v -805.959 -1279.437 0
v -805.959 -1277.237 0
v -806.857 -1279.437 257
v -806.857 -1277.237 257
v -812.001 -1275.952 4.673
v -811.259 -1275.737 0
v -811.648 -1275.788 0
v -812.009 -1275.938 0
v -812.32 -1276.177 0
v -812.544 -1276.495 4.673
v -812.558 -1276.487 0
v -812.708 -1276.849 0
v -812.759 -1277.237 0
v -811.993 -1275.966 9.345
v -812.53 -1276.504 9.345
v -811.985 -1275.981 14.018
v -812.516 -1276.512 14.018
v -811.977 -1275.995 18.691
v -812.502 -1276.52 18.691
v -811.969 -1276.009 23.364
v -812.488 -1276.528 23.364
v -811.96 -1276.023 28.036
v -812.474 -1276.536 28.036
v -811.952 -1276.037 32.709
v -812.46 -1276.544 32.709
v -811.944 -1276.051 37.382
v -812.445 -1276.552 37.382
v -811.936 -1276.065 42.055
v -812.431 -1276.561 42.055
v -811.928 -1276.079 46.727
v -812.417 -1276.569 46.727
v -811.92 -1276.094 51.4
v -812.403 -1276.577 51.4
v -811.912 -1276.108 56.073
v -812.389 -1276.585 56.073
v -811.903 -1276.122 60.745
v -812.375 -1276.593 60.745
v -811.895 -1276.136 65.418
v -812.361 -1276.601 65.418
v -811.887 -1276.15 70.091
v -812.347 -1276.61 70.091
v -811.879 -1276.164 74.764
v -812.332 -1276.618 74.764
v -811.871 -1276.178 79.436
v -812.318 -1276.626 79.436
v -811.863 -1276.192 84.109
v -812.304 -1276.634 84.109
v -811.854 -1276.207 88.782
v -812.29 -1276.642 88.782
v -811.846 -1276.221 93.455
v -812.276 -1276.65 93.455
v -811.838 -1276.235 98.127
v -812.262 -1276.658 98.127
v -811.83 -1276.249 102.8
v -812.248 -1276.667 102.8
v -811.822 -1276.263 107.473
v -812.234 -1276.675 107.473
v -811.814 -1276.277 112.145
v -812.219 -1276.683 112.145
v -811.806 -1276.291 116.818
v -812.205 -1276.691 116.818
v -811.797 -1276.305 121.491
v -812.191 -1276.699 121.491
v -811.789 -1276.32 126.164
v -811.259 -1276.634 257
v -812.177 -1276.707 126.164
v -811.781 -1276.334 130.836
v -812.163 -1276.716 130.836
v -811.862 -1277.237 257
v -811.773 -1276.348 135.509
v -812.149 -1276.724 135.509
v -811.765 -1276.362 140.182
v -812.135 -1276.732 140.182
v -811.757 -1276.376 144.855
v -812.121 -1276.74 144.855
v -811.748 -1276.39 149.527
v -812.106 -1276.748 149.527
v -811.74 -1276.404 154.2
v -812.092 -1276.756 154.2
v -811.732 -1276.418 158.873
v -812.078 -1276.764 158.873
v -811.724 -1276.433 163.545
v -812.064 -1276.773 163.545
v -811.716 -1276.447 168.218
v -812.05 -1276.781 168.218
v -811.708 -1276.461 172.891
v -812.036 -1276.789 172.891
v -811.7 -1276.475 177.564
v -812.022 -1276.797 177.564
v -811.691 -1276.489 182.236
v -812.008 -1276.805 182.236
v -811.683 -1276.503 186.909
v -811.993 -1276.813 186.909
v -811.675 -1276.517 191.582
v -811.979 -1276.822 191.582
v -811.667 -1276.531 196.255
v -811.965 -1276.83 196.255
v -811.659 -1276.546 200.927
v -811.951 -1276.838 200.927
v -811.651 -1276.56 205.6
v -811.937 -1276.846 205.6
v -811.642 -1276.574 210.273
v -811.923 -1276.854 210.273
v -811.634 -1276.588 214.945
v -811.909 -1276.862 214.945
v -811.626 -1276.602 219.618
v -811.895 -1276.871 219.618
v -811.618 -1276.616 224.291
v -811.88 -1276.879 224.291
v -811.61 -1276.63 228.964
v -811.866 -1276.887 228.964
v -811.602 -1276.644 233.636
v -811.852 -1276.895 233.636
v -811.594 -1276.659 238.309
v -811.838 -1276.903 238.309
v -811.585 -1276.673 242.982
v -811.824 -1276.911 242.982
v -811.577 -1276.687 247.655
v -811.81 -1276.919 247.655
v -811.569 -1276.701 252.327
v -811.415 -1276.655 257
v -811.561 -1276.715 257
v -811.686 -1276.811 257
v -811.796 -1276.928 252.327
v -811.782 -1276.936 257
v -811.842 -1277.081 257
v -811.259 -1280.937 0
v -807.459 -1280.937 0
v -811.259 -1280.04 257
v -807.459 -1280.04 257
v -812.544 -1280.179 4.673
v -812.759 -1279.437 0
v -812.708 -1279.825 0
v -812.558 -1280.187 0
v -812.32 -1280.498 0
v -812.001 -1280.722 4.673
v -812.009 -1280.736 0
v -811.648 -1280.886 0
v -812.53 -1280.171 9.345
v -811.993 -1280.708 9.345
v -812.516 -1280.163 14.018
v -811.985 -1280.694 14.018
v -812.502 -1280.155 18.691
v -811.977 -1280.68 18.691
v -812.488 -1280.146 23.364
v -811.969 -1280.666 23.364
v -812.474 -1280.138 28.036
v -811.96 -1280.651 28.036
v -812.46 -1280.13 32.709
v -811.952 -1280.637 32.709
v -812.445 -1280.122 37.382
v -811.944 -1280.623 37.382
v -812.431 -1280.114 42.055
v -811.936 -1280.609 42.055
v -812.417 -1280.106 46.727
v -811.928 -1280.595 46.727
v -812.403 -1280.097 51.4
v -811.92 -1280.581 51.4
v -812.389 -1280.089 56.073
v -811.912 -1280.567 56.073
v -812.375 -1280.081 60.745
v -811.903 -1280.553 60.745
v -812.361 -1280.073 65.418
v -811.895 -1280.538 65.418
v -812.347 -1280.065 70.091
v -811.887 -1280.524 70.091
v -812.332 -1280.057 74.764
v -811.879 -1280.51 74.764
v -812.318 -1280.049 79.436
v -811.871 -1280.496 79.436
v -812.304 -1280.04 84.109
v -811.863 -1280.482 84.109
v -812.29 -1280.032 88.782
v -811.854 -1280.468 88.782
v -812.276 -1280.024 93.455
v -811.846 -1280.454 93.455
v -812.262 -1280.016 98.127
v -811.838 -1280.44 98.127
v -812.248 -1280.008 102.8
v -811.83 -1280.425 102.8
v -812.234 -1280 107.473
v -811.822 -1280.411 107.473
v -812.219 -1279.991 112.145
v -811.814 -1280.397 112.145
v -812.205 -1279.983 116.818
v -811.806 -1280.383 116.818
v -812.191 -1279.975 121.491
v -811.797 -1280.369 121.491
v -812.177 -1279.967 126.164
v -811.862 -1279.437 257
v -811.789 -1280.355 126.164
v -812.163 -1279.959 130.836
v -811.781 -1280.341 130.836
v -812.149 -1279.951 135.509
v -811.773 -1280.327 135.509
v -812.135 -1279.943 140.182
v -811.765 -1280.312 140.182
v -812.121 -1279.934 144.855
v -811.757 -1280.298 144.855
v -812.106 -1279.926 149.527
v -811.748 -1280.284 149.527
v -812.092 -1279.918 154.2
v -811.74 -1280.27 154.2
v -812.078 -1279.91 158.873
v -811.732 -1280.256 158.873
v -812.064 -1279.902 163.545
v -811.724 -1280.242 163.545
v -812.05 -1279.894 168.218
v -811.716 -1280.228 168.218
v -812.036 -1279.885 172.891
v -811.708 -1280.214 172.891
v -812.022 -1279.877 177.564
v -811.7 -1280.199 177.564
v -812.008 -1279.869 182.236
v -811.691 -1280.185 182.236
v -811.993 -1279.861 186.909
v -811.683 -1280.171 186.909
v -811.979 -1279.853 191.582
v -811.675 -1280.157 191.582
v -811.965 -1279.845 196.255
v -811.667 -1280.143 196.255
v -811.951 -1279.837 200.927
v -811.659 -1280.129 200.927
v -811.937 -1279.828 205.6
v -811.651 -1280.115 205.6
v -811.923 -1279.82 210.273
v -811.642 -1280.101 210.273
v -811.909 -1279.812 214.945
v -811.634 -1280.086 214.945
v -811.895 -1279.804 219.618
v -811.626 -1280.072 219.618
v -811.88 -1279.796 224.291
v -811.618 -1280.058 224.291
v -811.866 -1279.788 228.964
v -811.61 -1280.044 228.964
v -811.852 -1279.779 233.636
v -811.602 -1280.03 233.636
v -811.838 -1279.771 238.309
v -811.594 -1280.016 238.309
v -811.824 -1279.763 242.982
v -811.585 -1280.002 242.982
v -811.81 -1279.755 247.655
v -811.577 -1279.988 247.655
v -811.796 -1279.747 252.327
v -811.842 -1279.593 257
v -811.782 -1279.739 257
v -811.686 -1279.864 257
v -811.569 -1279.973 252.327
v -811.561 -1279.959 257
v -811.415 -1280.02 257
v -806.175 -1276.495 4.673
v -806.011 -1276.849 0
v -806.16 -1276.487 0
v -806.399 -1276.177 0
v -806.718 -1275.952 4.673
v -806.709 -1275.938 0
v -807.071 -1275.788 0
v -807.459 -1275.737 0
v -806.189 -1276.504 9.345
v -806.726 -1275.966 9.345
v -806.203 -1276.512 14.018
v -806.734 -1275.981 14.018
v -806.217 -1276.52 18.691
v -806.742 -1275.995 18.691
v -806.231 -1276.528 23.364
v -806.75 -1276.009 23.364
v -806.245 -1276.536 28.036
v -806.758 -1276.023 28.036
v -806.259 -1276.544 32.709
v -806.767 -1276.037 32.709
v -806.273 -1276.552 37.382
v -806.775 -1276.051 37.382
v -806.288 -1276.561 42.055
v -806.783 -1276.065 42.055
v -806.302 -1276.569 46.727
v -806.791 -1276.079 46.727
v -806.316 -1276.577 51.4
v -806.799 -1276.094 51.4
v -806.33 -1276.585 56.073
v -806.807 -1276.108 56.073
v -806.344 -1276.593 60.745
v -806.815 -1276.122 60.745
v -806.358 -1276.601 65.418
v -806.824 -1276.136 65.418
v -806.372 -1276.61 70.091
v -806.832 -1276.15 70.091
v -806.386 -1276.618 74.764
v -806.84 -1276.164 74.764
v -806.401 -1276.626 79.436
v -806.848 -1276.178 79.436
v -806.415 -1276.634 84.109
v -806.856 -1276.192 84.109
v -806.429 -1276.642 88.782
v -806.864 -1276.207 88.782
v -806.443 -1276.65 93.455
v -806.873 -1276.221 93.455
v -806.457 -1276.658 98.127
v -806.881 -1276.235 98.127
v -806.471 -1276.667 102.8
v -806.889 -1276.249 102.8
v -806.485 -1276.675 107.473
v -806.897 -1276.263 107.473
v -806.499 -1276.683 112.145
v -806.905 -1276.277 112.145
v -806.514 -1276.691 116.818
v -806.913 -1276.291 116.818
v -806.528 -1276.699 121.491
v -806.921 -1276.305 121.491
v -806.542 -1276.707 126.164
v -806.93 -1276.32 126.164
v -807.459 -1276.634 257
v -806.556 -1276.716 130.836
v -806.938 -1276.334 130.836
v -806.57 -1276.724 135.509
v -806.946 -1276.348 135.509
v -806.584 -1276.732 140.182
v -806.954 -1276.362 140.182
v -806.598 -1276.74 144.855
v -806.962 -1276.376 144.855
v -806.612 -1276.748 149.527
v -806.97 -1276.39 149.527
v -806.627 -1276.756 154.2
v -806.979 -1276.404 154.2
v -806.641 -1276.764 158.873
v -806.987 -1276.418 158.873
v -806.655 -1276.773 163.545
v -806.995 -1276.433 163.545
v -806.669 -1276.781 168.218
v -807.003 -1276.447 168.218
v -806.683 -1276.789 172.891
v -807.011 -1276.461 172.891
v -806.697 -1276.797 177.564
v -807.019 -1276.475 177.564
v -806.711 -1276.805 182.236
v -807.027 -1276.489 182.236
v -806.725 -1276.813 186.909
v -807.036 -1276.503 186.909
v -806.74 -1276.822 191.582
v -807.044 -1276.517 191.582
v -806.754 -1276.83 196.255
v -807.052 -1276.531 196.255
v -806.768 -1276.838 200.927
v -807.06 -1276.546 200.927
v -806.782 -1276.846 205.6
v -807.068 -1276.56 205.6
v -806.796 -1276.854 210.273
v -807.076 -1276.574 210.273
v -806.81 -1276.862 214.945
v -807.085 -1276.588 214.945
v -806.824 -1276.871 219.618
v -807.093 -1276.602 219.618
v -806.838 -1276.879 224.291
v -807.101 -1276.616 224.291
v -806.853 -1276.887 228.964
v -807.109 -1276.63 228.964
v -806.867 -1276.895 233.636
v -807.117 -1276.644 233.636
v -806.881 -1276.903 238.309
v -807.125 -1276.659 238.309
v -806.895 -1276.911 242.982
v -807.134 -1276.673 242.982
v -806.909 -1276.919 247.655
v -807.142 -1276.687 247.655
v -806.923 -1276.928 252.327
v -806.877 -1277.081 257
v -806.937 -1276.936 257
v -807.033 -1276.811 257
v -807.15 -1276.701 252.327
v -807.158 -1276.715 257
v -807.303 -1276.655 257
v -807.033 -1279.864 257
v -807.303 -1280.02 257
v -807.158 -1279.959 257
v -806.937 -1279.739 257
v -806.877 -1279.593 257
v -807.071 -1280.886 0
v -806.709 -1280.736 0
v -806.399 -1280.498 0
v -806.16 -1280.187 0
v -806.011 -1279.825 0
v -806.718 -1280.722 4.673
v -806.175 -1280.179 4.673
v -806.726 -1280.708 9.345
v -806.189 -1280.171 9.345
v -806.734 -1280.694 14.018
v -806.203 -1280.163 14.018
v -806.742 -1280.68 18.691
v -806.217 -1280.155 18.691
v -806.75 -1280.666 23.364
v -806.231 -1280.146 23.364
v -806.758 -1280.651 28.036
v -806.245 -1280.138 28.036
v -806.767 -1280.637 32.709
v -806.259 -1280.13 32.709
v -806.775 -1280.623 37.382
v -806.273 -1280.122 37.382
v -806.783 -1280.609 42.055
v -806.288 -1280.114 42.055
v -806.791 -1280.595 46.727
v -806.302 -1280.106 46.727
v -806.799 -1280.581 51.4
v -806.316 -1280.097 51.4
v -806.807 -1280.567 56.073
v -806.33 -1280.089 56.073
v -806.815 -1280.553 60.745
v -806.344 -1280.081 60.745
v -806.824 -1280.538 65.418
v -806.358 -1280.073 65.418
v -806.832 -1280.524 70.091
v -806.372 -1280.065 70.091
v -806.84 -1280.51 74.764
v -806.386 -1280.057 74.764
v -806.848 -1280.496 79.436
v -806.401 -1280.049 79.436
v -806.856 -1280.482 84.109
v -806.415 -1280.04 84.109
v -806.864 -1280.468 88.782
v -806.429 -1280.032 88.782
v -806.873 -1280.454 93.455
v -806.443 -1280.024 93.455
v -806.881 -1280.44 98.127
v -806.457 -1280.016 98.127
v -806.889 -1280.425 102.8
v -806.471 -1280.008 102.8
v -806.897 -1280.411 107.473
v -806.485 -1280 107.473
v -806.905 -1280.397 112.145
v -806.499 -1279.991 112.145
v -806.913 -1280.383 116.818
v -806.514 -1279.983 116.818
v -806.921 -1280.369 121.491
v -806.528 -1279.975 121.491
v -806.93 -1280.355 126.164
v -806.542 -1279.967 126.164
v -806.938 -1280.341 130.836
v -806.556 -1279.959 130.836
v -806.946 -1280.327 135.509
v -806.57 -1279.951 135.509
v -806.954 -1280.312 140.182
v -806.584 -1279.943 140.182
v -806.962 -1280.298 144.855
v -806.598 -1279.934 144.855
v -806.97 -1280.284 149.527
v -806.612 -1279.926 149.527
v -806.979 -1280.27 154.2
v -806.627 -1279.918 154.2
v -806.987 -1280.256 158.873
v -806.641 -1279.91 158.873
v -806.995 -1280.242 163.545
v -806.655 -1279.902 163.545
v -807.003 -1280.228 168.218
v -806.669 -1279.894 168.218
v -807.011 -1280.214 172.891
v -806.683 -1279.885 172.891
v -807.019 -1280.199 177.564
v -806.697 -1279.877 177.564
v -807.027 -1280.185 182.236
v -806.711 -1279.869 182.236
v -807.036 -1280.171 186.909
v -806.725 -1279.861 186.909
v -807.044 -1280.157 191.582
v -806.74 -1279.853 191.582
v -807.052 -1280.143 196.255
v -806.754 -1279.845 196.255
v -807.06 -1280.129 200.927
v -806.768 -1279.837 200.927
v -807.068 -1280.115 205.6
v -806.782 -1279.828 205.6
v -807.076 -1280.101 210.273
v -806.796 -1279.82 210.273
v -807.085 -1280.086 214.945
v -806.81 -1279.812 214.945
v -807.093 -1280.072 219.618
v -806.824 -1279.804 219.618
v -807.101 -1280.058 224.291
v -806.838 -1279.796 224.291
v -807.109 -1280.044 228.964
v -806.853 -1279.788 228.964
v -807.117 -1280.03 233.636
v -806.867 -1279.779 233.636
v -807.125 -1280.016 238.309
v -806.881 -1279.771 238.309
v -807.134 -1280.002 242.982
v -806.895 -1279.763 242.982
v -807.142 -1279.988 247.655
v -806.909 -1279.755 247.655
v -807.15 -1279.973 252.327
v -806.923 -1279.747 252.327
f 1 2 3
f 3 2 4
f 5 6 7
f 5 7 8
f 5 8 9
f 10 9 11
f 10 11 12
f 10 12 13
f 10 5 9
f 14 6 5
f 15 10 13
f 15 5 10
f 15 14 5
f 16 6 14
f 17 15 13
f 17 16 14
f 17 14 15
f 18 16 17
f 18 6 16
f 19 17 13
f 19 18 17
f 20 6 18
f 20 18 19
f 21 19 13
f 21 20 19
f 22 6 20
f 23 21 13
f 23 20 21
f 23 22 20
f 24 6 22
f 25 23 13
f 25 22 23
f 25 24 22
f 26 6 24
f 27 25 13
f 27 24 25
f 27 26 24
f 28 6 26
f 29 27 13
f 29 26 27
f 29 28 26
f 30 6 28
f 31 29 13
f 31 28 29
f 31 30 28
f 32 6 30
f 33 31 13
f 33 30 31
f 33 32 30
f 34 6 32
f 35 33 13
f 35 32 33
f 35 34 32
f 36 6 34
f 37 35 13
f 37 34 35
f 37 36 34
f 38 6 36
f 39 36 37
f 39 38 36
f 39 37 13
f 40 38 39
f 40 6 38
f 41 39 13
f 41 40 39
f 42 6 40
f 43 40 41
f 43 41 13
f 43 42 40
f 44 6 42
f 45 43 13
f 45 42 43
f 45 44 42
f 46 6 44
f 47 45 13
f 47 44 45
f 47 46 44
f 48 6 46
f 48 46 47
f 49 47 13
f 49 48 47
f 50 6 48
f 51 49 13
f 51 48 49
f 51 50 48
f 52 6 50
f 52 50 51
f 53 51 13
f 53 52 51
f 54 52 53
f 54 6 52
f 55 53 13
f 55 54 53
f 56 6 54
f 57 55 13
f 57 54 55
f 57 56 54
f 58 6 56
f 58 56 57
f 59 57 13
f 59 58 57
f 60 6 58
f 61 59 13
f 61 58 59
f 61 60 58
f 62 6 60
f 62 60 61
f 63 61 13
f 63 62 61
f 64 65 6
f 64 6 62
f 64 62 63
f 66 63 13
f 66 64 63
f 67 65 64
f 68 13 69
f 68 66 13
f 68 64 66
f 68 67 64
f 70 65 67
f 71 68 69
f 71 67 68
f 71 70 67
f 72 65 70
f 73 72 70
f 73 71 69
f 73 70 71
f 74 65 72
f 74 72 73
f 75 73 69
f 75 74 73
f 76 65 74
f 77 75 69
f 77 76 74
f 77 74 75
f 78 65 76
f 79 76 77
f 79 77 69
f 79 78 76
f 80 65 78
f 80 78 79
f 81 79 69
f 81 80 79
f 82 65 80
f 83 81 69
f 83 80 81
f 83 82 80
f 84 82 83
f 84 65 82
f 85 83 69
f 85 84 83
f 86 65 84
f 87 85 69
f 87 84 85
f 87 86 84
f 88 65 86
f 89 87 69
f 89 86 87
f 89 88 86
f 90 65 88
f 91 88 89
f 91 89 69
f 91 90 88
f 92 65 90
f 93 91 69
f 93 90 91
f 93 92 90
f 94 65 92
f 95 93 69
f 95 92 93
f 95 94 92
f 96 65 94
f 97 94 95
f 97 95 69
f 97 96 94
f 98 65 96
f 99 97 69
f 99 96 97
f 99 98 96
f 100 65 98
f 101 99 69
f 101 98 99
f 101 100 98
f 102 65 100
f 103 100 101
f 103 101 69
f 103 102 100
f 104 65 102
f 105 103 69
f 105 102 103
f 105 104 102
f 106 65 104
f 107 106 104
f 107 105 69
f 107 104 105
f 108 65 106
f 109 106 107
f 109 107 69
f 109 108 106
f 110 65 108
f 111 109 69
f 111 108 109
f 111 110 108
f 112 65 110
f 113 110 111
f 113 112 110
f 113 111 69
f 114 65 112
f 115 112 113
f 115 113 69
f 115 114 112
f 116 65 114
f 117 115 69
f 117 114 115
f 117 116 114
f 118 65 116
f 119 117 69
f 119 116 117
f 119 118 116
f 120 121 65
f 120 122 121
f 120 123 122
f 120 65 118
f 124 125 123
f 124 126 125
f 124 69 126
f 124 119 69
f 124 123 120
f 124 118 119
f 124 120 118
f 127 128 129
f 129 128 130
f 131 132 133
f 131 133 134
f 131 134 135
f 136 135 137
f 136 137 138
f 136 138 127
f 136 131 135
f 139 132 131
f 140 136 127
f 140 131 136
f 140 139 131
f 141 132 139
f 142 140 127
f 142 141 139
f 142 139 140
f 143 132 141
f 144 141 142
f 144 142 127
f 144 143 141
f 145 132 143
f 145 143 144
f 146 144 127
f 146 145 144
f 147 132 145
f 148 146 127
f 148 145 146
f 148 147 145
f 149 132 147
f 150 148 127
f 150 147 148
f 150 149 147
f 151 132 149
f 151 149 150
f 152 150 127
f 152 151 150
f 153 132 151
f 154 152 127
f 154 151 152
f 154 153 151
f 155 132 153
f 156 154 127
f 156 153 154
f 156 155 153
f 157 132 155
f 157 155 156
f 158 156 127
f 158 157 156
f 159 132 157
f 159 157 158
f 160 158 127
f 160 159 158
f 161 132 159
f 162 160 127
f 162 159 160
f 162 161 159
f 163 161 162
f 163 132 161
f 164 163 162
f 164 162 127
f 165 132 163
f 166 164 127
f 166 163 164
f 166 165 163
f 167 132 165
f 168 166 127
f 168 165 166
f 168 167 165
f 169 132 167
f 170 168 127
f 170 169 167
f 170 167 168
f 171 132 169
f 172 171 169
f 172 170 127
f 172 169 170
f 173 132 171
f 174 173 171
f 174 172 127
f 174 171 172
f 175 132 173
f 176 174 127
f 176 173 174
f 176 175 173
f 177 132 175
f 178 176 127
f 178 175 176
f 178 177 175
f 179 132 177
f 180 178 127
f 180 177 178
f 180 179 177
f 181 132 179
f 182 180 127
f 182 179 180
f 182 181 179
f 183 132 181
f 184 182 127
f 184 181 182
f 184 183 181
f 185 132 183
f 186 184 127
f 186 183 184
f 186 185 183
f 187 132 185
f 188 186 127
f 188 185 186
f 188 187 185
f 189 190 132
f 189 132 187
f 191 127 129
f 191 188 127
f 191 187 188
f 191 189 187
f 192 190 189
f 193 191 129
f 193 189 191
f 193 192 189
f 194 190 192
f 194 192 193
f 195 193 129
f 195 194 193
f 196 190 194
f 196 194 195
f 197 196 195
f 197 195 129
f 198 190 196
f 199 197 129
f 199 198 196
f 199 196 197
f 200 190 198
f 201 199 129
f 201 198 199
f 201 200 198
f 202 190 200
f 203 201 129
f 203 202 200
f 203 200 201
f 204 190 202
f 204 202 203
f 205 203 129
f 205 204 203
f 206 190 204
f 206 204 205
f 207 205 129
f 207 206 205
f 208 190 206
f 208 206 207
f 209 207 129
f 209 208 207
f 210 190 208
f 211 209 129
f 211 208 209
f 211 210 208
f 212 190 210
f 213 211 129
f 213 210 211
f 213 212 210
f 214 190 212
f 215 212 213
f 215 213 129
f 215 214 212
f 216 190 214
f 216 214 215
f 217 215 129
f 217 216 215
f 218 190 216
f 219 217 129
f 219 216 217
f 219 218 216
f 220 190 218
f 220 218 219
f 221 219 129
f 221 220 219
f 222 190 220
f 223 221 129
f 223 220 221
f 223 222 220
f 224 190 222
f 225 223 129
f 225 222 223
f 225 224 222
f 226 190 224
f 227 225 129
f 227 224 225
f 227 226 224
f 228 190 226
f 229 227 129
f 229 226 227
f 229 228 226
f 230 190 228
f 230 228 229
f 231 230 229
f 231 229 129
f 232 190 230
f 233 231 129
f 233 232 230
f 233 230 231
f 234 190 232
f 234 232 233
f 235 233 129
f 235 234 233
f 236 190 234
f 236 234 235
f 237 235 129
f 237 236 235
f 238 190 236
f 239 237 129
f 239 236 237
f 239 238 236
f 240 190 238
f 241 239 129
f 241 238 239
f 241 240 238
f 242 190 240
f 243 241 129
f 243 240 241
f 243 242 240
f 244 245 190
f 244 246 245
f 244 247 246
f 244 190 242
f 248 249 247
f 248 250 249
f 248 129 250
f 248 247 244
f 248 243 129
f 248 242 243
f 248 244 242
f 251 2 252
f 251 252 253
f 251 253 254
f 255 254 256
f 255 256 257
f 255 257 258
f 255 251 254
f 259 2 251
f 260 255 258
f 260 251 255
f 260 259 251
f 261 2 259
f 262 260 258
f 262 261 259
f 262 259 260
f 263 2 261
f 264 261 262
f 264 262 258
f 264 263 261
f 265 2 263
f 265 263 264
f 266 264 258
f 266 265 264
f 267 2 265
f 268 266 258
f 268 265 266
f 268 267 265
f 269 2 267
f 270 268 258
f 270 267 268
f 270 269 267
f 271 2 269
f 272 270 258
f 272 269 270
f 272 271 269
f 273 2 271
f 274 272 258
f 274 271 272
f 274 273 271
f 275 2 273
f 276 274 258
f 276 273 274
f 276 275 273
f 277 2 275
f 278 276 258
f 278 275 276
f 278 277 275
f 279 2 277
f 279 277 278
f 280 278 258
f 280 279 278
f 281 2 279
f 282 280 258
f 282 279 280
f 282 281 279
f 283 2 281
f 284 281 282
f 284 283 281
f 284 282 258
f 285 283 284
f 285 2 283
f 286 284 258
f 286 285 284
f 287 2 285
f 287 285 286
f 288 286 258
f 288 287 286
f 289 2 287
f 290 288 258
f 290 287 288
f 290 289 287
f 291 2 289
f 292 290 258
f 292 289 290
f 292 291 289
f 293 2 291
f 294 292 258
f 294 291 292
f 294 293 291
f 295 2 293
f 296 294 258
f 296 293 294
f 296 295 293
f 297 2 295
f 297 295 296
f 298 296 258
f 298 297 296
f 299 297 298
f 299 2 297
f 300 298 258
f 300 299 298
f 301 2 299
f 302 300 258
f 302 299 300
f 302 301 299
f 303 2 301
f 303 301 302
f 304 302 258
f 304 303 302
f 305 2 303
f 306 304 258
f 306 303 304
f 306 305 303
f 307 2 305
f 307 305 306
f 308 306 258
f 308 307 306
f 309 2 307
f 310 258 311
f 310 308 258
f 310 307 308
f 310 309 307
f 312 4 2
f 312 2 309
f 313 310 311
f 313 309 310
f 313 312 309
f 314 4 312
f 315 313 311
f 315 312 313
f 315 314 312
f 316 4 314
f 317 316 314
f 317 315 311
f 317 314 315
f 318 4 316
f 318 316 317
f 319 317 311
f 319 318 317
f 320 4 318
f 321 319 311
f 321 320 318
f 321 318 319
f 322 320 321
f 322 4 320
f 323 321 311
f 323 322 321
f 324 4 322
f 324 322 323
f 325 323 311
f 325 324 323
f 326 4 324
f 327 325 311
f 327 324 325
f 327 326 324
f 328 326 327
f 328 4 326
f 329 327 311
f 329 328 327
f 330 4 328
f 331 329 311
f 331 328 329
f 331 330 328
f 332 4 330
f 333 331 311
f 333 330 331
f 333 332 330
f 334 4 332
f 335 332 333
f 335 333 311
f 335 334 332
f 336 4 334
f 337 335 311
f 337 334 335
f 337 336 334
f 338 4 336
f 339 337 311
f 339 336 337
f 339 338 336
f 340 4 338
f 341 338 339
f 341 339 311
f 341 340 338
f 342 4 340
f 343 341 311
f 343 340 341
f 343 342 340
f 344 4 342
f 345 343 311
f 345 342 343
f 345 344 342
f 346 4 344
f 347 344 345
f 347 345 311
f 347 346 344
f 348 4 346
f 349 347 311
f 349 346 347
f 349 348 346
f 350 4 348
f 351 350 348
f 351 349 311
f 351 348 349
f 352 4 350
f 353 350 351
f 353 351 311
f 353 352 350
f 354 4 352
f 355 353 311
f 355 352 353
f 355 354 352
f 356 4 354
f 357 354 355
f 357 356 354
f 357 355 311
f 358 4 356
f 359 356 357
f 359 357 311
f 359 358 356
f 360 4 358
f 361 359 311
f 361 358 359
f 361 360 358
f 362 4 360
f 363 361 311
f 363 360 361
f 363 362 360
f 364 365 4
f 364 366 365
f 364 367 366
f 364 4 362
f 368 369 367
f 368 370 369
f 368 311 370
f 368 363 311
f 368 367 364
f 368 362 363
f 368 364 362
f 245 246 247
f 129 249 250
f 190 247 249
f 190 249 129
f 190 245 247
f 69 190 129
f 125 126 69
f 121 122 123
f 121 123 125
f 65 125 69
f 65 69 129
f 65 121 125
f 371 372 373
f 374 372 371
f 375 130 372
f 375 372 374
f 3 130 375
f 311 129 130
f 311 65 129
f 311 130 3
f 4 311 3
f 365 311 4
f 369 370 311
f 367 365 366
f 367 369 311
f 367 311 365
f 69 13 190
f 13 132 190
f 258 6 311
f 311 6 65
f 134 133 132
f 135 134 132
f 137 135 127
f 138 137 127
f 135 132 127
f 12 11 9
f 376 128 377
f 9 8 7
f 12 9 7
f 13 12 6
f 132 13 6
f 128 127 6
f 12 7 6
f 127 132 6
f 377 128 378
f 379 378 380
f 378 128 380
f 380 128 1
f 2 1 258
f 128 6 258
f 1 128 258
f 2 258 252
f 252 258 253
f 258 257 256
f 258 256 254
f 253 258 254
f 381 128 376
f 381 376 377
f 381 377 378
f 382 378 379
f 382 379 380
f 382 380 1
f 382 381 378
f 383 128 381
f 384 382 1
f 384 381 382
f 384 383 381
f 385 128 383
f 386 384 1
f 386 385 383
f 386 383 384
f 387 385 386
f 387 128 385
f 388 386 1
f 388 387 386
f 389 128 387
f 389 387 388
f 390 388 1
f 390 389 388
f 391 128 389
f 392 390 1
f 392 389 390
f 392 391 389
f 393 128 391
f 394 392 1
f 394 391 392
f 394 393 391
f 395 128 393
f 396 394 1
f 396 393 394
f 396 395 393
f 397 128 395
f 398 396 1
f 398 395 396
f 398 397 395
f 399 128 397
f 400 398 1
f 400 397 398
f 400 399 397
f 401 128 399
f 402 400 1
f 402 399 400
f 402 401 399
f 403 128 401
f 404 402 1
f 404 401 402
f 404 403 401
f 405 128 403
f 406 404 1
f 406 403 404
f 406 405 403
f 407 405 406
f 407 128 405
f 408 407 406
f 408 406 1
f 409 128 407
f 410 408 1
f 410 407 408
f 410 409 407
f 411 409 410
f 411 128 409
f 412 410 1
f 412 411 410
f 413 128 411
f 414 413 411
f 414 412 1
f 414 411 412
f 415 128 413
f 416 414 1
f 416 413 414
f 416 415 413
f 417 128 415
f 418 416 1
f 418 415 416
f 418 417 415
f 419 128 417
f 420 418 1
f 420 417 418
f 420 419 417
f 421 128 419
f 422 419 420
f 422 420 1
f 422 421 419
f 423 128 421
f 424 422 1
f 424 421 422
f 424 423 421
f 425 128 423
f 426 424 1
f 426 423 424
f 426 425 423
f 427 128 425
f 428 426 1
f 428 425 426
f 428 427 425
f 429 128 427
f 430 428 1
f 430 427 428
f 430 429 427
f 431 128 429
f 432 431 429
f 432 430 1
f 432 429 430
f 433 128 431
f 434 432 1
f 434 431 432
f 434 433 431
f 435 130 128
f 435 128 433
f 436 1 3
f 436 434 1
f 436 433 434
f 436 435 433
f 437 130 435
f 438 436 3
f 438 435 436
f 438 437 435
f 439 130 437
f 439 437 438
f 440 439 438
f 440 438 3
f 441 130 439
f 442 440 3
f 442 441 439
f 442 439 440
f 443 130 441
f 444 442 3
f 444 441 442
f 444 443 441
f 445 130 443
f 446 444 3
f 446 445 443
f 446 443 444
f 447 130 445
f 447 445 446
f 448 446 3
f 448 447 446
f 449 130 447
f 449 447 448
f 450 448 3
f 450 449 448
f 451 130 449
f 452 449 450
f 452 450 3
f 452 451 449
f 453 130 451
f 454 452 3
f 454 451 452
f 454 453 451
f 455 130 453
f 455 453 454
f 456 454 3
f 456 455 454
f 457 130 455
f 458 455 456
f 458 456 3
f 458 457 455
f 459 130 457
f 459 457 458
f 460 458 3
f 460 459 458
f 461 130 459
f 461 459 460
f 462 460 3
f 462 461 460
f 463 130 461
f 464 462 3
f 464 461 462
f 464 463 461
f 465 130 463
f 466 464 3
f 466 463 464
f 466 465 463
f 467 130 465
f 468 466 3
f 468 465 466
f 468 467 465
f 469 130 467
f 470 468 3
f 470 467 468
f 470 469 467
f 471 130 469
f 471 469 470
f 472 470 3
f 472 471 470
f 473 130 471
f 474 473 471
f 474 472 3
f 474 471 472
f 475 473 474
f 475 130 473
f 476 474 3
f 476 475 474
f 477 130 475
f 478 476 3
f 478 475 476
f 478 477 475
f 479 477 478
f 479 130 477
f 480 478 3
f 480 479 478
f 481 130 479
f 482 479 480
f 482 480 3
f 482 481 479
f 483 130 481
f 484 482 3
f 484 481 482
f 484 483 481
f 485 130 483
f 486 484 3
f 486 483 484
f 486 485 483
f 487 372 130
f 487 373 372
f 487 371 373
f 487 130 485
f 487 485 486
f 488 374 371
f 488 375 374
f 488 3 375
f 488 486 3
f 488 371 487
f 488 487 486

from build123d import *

# Parameters (mm, degrees)
BOSS_EXTRUDE1_DEPTH = 257
BOSS_EXTRUDE1_TAPER = 0.2


with BuildPart() as part:
    # Sketch1 → Boss-Extrude1 (new body)
    with BuildSketch(Plane.XY):
        with BuildLine():
            Line((-805.959430903, -1279.437202161), (-805.959430903, -1277.237202161))
            ThreePointArc((-805.959430903, -1277.237202161), (-806.398770731, -1276.176541989), (-807.459430903, -1275.737202161))
            Line((-807.459430903, -1275.737202161), (-811.259430903, -1275.737202161))
            ThreePointArc((-811.259430903, -1275.737202161), (-812.320091075, -1276.176541989), (-812.759430903, -1277.237202161))
            Line((-812.759430903, -1277.237202161), (-812.759430903, -1279.437202161))
            ThreePointArc((-812.759430903, -1279.437202161), (-812.320091075, -1280.497862332), (-811.259430903, -1280.937202161))
            Line((-811.259430903, -1280.937202161), (-807.459430903, -1280.937202161))
            ThreePointArc((-807.459430903, -1280.937202161), (-806.398770731, -1280.497862332), (-805.959430903, -1279.437202161))
        make_face()
    extrude(amount=BOSS_EXTRUDE1_DEPTH, taper=BOSS_EXTRUDE1_TAPER)


solid = part.part
